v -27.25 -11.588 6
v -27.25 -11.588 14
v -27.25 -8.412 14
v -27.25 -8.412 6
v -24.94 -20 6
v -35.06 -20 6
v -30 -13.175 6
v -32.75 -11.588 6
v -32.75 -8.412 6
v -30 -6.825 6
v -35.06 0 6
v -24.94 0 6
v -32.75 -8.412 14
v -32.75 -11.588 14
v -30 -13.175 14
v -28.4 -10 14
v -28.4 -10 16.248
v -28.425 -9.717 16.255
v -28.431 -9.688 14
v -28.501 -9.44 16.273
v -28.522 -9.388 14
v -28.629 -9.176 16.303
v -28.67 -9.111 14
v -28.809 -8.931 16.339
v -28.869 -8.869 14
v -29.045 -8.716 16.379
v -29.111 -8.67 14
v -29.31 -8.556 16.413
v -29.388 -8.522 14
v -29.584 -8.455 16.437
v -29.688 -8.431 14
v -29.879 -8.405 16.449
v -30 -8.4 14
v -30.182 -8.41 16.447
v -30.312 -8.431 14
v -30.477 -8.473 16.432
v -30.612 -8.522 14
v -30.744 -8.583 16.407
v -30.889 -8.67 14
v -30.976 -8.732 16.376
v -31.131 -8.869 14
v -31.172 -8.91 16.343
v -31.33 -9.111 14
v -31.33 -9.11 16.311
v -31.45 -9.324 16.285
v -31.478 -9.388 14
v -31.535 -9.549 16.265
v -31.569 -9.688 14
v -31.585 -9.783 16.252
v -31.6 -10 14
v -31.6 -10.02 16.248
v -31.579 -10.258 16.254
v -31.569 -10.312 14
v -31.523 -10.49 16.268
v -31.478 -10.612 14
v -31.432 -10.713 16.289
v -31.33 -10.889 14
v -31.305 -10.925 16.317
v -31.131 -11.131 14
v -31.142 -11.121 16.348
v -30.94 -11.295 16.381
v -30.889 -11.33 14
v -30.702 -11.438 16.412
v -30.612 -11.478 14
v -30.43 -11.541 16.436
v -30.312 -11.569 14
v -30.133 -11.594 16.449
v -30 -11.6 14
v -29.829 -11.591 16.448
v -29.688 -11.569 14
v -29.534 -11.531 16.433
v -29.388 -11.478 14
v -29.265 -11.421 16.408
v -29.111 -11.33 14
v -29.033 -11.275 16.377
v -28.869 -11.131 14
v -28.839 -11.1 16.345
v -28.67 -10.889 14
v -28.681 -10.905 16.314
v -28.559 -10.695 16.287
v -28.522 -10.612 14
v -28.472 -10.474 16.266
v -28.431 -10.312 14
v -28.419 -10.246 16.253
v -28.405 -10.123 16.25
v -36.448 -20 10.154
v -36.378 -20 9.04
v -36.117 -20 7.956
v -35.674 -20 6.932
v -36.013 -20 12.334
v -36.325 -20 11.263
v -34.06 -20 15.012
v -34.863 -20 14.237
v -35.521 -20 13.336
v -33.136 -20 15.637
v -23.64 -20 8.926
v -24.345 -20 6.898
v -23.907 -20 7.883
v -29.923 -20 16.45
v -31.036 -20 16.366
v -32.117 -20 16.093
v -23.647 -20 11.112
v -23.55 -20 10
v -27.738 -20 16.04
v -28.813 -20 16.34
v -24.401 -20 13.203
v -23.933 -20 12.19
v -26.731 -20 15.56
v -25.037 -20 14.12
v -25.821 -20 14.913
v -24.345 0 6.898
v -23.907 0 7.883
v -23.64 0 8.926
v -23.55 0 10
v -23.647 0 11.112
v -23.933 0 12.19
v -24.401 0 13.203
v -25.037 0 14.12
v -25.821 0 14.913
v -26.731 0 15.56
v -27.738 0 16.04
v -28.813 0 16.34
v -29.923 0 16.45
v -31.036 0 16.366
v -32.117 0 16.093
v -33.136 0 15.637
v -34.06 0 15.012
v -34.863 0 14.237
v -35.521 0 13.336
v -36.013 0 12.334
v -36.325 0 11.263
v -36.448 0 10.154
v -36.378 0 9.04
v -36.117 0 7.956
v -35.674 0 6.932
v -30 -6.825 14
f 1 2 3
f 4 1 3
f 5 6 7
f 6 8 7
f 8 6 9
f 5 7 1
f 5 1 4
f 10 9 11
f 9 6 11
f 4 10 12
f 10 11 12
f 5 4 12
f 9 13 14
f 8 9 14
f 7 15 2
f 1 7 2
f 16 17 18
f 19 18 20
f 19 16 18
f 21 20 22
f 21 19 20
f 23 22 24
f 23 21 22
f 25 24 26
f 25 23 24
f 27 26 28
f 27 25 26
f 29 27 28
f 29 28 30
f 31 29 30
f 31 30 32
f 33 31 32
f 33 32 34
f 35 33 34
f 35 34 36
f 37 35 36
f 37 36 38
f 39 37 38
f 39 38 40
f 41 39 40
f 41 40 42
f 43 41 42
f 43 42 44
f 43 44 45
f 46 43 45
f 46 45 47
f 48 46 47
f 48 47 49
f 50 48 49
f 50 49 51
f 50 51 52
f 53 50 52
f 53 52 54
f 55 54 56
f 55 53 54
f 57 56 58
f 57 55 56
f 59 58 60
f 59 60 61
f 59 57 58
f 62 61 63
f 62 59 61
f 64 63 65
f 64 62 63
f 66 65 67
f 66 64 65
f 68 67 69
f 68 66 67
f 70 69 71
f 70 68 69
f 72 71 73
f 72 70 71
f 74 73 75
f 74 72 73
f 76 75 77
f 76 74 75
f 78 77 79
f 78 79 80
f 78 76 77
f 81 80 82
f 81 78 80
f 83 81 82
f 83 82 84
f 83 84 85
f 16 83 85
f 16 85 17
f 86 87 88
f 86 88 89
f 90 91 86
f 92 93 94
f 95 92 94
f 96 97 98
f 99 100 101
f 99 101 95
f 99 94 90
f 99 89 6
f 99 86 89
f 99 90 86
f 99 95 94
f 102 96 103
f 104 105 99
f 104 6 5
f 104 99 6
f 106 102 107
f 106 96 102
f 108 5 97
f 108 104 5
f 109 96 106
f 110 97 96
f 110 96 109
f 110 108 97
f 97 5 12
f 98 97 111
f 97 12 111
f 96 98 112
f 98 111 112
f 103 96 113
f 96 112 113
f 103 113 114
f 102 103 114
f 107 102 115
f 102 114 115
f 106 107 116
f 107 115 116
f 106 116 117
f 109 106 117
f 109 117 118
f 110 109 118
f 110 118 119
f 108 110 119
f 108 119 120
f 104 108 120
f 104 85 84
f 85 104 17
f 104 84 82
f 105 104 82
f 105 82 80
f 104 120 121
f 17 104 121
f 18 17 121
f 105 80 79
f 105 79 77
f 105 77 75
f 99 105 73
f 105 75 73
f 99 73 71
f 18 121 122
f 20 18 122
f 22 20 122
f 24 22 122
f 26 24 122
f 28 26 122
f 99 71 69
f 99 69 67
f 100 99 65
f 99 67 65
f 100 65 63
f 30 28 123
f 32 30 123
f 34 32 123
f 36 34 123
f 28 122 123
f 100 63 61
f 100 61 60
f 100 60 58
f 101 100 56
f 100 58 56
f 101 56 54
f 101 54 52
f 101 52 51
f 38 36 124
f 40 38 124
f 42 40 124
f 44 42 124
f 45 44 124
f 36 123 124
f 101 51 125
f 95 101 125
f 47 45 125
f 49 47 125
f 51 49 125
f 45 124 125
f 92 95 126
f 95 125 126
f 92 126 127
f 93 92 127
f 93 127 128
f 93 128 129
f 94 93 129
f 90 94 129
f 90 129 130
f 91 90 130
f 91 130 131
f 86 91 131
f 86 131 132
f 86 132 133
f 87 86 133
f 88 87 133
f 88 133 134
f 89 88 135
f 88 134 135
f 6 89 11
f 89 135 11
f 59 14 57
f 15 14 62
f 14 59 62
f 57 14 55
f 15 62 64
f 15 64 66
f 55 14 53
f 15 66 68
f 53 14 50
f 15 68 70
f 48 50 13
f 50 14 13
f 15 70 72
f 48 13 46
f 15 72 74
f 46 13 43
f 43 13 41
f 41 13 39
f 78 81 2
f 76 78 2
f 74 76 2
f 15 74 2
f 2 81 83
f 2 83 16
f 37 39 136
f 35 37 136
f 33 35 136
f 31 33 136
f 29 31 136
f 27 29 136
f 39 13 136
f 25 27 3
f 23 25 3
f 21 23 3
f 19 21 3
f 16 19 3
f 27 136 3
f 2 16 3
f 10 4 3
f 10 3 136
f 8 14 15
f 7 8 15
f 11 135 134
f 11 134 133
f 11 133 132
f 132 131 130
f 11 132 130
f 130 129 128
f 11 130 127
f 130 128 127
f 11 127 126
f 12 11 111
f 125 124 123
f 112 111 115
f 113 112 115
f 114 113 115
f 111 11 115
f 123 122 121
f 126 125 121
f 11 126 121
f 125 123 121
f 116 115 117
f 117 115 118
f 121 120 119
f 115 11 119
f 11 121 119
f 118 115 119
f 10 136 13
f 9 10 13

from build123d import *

# Parameters (mm, degrees)
SKETCH009_R     = 6.45
PAD004_DEPTH    = 20
SKETCH010_R     = 1.6
POCKET005_DEPTH = 20
POCKET006_DEPTH = 10
SKETCH012_W     = 20
SKETCH012_H     = 6
POCKET007_DEPTH = 21


with BuildPart() as part:
    # Sketch009 → Pad004 (new body)
    with BuildSketch(Plane.XZ):
        with Locations((-30, 10)):
            Circle(SKETCH009_R)
    extrude(amount=PAD004_DEPTH)

    # Sketch010 → Pocket005 (cut)
    with BuildSketch(Plane.XY):
        with Locations((-30, -10)):
            Circle(SKETCH010_R)
    extrude(amount=POCKET005_DEPTH, mode=Mode.SUBTRACT)

    # Sketch011 → Pocket006 (cut)
    with BuildSketch(Plane.XY.offset(14)):
        Polygon((-27.25, -8.412287), (-30, -6.824574), (-32.75, -8.412287), (-32.75, -11.587713), (-30, -13.175426), (-27.25, -11.587713), align=None)
    extrude(amount=-POCKET006_DEPTH, mode=Mode.SUBTRACT)

    # Sketch012 → Pocket007 (cut)
    with BuildSketch(Plane.XZ):
        with Locations((-30.92, 3)):
            Rectangle(SKETCH012_W, SKETCH012_H)
    extrude(amount=POCKET007_DEPTH, mode=Mode.SUBTRACT)


solid = part.part
